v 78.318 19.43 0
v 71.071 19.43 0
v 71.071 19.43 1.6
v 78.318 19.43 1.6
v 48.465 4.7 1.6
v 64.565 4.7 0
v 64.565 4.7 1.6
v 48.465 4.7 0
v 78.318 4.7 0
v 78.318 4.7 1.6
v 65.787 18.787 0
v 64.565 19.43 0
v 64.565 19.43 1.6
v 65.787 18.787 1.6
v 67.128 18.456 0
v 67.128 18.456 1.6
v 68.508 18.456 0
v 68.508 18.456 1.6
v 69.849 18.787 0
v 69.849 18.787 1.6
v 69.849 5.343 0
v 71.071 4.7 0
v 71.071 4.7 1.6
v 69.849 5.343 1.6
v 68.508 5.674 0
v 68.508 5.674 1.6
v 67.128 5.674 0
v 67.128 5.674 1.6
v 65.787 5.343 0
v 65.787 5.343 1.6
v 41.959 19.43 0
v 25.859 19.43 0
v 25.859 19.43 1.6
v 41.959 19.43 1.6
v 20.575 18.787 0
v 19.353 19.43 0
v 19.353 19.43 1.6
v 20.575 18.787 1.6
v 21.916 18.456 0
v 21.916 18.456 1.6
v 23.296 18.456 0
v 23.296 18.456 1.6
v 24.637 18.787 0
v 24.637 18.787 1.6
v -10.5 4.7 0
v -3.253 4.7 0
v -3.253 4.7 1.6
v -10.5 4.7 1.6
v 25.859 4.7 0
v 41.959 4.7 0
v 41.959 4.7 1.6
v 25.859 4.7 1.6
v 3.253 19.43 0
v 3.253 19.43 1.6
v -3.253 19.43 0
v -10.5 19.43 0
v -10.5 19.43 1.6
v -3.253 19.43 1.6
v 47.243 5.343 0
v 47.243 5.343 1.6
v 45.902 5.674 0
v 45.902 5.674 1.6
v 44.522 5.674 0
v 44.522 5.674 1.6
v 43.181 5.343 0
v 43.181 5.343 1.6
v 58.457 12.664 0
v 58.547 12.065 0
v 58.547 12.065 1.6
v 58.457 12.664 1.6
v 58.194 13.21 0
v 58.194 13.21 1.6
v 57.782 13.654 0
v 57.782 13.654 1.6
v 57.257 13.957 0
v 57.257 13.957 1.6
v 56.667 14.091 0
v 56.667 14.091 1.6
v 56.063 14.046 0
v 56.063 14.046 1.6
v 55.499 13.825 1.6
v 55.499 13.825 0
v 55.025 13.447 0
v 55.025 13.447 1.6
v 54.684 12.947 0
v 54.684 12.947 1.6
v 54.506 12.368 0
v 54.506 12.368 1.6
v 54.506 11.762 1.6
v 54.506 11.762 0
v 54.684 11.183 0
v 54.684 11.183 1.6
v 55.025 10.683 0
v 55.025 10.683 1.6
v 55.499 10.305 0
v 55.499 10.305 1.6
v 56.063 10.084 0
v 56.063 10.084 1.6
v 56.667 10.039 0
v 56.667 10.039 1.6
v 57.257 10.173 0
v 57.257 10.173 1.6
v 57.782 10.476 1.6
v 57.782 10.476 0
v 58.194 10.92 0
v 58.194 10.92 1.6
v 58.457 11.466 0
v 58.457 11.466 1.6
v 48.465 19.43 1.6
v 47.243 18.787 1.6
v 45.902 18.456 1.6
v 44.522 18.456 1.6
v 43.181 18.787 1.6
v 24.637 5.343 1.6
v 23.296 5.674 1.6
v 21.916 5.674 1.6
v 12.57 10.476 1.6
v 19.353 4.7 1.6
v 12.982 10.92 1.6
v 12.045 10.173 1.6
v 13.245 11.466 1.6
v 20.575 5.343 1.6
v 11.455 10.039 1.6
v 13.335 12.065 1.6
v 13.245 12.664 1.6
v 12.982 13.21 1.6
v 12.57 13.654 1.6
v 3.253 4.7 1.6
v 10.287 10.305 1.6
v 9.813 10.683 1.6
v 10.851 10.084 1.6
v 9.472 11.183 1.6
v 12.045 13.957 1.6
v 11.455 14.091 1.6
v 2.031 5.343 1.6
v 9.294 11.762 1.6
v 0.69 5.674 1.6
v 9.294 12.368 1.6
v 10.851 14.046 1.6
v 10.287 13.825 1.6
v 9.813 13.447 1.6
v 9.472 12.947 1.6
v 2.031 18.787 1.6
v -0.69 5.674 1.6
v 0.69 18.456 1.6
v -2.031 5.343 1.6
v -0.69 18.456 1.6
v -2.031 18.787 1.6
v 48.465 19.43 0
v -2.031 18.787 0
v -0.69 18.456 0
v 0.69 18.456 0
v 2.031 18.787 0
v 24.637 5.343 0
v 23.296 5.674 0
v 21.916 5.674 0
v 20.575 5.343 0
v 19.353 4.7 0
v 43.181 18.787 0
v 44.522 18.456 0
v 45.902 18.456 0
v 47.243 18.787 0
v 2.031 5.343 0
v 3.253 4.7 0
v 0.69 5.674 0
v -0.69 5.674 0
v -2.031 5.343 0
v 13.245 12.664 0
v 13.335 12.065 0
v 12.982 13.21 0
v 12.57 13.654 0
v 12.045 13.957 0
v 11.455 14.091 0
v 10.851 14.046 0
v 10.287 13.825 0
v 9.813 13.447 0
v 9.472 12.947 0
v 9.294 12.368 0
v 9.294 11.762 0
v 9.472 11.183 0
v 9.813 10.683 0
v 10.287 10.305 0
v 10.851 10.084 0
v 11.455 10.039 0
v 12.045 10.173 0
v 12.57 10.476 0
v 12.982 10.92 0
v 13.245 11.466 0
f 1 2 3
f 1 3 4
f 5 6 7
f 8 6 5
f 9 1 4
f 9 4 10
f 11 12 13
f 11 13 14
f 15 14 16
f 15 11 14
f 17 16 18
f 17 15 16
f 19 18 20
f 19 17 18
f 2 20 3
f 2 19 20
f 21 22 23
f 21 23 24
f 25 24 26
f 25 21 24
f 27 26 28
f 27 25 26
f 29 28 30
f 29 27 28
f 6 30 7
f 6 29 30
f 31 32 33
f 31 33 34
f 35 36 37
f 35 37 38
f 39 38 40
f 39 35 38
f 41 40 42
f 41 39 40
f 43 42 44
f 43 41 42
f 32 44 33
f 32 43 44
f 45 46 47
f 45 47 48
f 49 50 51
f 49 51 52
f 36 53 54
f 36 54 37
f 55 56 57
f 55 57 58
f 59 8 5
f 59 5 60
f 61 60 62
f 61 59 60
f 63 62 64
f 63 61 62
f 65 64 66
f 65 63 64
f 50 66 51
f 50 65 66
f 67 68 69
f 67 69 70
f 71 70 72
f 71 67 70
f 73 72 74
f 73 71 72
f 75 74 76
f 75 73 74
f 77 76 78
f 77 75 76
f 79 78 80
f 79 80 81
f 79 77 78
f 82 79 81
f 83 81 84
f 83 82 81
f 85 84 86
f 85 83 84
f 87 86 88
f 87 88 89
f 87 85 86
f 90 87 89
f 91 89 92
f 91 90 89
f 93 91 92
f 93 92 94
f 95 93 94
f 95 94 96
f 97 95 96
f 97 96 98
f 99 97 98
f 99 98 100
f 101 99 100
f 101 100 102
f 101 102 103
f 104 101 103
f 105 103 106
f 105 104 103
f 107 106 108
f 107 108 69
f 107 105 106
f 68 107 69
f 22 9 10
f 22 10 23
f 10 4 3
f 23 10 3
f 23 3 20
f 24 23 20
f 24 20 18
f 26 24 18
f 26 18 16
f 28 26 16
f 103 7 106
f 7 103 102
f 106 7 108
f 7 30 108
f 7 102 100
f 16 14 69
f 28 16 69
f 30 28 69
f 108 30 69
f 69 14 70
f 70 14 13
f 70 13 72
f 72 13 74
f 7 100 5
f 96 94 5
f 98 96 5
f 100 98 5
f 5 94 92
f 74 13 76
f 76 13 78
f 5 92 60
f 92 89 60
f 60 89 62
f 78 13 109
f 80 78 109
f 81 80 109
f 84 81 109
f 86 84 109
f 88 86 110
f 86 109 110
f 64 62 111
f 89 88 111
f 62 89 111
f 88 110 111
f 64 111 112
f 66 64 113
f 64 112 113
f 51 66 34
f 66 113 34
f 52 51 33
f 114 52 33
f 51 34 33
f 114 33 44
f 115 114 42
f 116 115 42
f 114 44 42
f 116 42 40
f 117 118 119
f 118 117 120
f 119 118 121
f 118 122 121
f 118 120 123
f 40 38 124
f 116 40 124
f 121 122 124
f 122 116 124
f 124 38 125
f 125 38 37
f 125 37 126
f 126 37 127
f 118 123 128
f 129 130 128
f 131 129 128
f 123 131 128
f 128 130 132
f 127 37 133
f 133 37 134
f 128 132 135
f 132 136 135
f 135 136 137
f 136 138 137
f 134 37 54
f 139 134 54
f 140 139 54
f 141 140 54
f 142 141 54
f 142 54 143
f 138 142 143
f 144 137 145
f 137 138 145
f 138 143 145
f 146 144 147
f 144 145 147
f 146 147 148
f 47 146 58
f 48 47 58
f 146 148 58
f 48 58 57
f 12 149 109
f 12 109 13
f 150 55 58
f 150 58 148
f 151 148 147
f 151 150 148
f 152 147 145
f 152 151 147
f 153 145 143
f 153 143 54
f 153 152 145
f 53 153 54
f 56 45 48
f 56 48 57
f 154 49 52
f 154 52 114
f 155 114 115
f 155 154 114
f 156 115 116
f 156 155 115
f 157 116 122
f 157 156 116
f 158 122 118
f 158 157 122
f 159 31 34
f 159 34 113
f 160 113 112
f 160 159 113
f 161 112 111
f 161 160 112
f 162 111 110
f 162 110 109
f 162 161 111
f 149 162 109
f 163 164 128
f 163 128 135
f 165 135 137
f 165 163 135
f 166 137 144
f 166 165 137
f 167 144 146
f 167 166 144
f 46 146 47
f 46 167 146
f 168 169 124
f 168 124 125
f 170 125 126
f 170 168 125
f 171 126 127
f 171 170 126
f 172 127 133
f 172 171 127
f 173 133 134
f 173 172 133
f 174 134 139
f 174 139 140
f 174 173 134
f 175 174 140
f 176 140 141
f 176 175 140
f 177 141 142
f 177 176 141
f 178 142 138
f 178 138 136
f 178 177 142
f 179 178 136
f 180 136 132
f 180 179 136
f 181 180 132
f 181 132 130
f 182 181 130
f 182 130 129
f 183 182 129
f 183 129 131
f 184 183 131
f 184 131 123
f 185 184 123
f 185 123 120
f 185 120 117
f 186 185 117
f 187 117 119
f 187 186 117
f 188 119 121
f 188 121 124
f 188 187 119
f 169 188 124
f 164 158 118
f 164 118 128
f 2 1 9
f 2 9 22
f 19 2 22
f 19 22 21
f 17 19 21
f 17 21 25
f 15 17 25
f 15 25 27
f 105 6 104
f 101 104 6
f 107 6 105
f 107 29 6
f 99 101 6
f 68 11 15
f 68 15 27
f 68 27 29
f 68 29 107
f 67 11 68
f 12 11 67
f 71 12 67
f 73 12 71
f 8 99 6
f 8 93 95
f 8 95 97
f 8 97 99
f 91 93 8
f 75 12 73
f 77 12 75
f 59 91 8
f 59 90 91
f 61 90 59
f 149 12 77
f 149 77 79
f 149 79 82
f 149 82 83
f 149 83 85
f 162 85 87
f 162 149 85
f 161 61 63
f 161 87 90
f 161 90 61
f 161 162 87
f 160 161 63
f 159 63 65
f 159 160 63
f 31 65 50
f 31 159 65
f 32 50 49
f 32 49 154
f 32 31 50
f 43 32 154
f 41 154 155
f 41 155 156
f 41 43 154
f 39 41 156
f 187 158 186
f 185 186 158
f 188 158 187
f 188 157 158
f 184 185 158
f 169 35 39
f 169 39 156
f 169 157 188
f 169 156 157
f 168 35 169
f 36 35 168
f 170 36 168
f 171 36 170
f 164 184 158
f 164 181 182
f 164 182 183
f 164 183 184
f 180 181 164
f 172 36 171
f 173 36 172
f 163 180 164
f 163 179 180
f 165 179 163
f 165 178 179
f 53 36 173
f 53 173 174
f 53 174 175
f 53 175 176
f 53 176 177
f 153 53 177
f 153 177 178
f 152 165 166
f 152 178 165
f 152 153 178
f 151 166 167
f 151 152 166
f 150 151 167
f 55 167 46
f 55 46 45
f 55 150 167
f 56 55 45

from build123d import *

# Parameters (mm, degrees)
SKETCH1_R           = 2.032
BOSS_EXTRUDE1_DEPTH = 1.6


with BuildPart() as part:
    # Sketch1 → Boss-Extrude1 (new body)
    with BuildSketch(Plane.XY):
        with BuildLine():
            Line((3.253099445, 19.430000002), (19.352900555, 19.430000002))
            ThreePointArc((19.352900555, 19.430000002), (22.606, 18.414000002), (25.859099445, 19.430000002))
            Line((25.859099445, 19.430000002), (41.958900555, 19.430000002))
            ThreePointArc((41.958900555, 19.430000002), (45.212, 18.414000002), (48.465099445, 19.430000002))
            Line((48.465099445, 19.430000002), (64.564900555, 19.430000002))
            ThreePointArc((64.564900555, 19.430000002), (67.818, 18.414000002), (71.071099445, 19.430000002))
            Line((71.071099445, 19.430000002), (78.318, 19.430000002))
            Line((78.318, 19.430000002), (78.318, 4.699999998))
            Line((78.318, 4.699999998), (71.071099445, 4.699999998))
            ThreePointArc((71.071099445, 4.699999998), (67.818, 5.715999998), (64.564900555, 4.699999998))
            Line((64.564900555, 4.699999998), (48.465099445, 4.699999998))
            ThreePointArc((48.465099445, 4.699999998), (45.212, 5.715999998), (41.958900555, 4.699999998))
            Line((41.958900555, 4.699999998), (25.859099445, 4.699999998))
            ThreePointArc((25.859099445, 4.699999998), (22.606, 5.715999998), (19.352900555, 4.699999998))
            Line((19.352900555, 4.699999998), (3.253099445, 4.699999998))
            ThreePointArc((3.253099445, 4.699999998), (0, 5.715999998), (-3.253099445, 4.699999998))
            Line((-3.253099445, 4.699999998), (-10.5, 4.699999998))
            Line((-10.5, 4.699999998), (-10.5, 19.430000002))
            Line((-10.5, 19.430000002), (-3.253099445, 19.430000002))
            ThreePointArc((-3.253099445, 19.430000002), (0, 18.414000002), (3.253099445, 19.430000002))
        make_face()
        with Locations((11.303, 12.065)):
            Circle(SKETCH1_R, mode=Mode.SUBTRACT)
        with Locations((56.515, 12.065)):
            Circle(SKETCH1_R, mode=Mode.SUBTRACT)
    extrude(amount=BOSS_EXTRUDE1_DEPTH)


solid = part.part
